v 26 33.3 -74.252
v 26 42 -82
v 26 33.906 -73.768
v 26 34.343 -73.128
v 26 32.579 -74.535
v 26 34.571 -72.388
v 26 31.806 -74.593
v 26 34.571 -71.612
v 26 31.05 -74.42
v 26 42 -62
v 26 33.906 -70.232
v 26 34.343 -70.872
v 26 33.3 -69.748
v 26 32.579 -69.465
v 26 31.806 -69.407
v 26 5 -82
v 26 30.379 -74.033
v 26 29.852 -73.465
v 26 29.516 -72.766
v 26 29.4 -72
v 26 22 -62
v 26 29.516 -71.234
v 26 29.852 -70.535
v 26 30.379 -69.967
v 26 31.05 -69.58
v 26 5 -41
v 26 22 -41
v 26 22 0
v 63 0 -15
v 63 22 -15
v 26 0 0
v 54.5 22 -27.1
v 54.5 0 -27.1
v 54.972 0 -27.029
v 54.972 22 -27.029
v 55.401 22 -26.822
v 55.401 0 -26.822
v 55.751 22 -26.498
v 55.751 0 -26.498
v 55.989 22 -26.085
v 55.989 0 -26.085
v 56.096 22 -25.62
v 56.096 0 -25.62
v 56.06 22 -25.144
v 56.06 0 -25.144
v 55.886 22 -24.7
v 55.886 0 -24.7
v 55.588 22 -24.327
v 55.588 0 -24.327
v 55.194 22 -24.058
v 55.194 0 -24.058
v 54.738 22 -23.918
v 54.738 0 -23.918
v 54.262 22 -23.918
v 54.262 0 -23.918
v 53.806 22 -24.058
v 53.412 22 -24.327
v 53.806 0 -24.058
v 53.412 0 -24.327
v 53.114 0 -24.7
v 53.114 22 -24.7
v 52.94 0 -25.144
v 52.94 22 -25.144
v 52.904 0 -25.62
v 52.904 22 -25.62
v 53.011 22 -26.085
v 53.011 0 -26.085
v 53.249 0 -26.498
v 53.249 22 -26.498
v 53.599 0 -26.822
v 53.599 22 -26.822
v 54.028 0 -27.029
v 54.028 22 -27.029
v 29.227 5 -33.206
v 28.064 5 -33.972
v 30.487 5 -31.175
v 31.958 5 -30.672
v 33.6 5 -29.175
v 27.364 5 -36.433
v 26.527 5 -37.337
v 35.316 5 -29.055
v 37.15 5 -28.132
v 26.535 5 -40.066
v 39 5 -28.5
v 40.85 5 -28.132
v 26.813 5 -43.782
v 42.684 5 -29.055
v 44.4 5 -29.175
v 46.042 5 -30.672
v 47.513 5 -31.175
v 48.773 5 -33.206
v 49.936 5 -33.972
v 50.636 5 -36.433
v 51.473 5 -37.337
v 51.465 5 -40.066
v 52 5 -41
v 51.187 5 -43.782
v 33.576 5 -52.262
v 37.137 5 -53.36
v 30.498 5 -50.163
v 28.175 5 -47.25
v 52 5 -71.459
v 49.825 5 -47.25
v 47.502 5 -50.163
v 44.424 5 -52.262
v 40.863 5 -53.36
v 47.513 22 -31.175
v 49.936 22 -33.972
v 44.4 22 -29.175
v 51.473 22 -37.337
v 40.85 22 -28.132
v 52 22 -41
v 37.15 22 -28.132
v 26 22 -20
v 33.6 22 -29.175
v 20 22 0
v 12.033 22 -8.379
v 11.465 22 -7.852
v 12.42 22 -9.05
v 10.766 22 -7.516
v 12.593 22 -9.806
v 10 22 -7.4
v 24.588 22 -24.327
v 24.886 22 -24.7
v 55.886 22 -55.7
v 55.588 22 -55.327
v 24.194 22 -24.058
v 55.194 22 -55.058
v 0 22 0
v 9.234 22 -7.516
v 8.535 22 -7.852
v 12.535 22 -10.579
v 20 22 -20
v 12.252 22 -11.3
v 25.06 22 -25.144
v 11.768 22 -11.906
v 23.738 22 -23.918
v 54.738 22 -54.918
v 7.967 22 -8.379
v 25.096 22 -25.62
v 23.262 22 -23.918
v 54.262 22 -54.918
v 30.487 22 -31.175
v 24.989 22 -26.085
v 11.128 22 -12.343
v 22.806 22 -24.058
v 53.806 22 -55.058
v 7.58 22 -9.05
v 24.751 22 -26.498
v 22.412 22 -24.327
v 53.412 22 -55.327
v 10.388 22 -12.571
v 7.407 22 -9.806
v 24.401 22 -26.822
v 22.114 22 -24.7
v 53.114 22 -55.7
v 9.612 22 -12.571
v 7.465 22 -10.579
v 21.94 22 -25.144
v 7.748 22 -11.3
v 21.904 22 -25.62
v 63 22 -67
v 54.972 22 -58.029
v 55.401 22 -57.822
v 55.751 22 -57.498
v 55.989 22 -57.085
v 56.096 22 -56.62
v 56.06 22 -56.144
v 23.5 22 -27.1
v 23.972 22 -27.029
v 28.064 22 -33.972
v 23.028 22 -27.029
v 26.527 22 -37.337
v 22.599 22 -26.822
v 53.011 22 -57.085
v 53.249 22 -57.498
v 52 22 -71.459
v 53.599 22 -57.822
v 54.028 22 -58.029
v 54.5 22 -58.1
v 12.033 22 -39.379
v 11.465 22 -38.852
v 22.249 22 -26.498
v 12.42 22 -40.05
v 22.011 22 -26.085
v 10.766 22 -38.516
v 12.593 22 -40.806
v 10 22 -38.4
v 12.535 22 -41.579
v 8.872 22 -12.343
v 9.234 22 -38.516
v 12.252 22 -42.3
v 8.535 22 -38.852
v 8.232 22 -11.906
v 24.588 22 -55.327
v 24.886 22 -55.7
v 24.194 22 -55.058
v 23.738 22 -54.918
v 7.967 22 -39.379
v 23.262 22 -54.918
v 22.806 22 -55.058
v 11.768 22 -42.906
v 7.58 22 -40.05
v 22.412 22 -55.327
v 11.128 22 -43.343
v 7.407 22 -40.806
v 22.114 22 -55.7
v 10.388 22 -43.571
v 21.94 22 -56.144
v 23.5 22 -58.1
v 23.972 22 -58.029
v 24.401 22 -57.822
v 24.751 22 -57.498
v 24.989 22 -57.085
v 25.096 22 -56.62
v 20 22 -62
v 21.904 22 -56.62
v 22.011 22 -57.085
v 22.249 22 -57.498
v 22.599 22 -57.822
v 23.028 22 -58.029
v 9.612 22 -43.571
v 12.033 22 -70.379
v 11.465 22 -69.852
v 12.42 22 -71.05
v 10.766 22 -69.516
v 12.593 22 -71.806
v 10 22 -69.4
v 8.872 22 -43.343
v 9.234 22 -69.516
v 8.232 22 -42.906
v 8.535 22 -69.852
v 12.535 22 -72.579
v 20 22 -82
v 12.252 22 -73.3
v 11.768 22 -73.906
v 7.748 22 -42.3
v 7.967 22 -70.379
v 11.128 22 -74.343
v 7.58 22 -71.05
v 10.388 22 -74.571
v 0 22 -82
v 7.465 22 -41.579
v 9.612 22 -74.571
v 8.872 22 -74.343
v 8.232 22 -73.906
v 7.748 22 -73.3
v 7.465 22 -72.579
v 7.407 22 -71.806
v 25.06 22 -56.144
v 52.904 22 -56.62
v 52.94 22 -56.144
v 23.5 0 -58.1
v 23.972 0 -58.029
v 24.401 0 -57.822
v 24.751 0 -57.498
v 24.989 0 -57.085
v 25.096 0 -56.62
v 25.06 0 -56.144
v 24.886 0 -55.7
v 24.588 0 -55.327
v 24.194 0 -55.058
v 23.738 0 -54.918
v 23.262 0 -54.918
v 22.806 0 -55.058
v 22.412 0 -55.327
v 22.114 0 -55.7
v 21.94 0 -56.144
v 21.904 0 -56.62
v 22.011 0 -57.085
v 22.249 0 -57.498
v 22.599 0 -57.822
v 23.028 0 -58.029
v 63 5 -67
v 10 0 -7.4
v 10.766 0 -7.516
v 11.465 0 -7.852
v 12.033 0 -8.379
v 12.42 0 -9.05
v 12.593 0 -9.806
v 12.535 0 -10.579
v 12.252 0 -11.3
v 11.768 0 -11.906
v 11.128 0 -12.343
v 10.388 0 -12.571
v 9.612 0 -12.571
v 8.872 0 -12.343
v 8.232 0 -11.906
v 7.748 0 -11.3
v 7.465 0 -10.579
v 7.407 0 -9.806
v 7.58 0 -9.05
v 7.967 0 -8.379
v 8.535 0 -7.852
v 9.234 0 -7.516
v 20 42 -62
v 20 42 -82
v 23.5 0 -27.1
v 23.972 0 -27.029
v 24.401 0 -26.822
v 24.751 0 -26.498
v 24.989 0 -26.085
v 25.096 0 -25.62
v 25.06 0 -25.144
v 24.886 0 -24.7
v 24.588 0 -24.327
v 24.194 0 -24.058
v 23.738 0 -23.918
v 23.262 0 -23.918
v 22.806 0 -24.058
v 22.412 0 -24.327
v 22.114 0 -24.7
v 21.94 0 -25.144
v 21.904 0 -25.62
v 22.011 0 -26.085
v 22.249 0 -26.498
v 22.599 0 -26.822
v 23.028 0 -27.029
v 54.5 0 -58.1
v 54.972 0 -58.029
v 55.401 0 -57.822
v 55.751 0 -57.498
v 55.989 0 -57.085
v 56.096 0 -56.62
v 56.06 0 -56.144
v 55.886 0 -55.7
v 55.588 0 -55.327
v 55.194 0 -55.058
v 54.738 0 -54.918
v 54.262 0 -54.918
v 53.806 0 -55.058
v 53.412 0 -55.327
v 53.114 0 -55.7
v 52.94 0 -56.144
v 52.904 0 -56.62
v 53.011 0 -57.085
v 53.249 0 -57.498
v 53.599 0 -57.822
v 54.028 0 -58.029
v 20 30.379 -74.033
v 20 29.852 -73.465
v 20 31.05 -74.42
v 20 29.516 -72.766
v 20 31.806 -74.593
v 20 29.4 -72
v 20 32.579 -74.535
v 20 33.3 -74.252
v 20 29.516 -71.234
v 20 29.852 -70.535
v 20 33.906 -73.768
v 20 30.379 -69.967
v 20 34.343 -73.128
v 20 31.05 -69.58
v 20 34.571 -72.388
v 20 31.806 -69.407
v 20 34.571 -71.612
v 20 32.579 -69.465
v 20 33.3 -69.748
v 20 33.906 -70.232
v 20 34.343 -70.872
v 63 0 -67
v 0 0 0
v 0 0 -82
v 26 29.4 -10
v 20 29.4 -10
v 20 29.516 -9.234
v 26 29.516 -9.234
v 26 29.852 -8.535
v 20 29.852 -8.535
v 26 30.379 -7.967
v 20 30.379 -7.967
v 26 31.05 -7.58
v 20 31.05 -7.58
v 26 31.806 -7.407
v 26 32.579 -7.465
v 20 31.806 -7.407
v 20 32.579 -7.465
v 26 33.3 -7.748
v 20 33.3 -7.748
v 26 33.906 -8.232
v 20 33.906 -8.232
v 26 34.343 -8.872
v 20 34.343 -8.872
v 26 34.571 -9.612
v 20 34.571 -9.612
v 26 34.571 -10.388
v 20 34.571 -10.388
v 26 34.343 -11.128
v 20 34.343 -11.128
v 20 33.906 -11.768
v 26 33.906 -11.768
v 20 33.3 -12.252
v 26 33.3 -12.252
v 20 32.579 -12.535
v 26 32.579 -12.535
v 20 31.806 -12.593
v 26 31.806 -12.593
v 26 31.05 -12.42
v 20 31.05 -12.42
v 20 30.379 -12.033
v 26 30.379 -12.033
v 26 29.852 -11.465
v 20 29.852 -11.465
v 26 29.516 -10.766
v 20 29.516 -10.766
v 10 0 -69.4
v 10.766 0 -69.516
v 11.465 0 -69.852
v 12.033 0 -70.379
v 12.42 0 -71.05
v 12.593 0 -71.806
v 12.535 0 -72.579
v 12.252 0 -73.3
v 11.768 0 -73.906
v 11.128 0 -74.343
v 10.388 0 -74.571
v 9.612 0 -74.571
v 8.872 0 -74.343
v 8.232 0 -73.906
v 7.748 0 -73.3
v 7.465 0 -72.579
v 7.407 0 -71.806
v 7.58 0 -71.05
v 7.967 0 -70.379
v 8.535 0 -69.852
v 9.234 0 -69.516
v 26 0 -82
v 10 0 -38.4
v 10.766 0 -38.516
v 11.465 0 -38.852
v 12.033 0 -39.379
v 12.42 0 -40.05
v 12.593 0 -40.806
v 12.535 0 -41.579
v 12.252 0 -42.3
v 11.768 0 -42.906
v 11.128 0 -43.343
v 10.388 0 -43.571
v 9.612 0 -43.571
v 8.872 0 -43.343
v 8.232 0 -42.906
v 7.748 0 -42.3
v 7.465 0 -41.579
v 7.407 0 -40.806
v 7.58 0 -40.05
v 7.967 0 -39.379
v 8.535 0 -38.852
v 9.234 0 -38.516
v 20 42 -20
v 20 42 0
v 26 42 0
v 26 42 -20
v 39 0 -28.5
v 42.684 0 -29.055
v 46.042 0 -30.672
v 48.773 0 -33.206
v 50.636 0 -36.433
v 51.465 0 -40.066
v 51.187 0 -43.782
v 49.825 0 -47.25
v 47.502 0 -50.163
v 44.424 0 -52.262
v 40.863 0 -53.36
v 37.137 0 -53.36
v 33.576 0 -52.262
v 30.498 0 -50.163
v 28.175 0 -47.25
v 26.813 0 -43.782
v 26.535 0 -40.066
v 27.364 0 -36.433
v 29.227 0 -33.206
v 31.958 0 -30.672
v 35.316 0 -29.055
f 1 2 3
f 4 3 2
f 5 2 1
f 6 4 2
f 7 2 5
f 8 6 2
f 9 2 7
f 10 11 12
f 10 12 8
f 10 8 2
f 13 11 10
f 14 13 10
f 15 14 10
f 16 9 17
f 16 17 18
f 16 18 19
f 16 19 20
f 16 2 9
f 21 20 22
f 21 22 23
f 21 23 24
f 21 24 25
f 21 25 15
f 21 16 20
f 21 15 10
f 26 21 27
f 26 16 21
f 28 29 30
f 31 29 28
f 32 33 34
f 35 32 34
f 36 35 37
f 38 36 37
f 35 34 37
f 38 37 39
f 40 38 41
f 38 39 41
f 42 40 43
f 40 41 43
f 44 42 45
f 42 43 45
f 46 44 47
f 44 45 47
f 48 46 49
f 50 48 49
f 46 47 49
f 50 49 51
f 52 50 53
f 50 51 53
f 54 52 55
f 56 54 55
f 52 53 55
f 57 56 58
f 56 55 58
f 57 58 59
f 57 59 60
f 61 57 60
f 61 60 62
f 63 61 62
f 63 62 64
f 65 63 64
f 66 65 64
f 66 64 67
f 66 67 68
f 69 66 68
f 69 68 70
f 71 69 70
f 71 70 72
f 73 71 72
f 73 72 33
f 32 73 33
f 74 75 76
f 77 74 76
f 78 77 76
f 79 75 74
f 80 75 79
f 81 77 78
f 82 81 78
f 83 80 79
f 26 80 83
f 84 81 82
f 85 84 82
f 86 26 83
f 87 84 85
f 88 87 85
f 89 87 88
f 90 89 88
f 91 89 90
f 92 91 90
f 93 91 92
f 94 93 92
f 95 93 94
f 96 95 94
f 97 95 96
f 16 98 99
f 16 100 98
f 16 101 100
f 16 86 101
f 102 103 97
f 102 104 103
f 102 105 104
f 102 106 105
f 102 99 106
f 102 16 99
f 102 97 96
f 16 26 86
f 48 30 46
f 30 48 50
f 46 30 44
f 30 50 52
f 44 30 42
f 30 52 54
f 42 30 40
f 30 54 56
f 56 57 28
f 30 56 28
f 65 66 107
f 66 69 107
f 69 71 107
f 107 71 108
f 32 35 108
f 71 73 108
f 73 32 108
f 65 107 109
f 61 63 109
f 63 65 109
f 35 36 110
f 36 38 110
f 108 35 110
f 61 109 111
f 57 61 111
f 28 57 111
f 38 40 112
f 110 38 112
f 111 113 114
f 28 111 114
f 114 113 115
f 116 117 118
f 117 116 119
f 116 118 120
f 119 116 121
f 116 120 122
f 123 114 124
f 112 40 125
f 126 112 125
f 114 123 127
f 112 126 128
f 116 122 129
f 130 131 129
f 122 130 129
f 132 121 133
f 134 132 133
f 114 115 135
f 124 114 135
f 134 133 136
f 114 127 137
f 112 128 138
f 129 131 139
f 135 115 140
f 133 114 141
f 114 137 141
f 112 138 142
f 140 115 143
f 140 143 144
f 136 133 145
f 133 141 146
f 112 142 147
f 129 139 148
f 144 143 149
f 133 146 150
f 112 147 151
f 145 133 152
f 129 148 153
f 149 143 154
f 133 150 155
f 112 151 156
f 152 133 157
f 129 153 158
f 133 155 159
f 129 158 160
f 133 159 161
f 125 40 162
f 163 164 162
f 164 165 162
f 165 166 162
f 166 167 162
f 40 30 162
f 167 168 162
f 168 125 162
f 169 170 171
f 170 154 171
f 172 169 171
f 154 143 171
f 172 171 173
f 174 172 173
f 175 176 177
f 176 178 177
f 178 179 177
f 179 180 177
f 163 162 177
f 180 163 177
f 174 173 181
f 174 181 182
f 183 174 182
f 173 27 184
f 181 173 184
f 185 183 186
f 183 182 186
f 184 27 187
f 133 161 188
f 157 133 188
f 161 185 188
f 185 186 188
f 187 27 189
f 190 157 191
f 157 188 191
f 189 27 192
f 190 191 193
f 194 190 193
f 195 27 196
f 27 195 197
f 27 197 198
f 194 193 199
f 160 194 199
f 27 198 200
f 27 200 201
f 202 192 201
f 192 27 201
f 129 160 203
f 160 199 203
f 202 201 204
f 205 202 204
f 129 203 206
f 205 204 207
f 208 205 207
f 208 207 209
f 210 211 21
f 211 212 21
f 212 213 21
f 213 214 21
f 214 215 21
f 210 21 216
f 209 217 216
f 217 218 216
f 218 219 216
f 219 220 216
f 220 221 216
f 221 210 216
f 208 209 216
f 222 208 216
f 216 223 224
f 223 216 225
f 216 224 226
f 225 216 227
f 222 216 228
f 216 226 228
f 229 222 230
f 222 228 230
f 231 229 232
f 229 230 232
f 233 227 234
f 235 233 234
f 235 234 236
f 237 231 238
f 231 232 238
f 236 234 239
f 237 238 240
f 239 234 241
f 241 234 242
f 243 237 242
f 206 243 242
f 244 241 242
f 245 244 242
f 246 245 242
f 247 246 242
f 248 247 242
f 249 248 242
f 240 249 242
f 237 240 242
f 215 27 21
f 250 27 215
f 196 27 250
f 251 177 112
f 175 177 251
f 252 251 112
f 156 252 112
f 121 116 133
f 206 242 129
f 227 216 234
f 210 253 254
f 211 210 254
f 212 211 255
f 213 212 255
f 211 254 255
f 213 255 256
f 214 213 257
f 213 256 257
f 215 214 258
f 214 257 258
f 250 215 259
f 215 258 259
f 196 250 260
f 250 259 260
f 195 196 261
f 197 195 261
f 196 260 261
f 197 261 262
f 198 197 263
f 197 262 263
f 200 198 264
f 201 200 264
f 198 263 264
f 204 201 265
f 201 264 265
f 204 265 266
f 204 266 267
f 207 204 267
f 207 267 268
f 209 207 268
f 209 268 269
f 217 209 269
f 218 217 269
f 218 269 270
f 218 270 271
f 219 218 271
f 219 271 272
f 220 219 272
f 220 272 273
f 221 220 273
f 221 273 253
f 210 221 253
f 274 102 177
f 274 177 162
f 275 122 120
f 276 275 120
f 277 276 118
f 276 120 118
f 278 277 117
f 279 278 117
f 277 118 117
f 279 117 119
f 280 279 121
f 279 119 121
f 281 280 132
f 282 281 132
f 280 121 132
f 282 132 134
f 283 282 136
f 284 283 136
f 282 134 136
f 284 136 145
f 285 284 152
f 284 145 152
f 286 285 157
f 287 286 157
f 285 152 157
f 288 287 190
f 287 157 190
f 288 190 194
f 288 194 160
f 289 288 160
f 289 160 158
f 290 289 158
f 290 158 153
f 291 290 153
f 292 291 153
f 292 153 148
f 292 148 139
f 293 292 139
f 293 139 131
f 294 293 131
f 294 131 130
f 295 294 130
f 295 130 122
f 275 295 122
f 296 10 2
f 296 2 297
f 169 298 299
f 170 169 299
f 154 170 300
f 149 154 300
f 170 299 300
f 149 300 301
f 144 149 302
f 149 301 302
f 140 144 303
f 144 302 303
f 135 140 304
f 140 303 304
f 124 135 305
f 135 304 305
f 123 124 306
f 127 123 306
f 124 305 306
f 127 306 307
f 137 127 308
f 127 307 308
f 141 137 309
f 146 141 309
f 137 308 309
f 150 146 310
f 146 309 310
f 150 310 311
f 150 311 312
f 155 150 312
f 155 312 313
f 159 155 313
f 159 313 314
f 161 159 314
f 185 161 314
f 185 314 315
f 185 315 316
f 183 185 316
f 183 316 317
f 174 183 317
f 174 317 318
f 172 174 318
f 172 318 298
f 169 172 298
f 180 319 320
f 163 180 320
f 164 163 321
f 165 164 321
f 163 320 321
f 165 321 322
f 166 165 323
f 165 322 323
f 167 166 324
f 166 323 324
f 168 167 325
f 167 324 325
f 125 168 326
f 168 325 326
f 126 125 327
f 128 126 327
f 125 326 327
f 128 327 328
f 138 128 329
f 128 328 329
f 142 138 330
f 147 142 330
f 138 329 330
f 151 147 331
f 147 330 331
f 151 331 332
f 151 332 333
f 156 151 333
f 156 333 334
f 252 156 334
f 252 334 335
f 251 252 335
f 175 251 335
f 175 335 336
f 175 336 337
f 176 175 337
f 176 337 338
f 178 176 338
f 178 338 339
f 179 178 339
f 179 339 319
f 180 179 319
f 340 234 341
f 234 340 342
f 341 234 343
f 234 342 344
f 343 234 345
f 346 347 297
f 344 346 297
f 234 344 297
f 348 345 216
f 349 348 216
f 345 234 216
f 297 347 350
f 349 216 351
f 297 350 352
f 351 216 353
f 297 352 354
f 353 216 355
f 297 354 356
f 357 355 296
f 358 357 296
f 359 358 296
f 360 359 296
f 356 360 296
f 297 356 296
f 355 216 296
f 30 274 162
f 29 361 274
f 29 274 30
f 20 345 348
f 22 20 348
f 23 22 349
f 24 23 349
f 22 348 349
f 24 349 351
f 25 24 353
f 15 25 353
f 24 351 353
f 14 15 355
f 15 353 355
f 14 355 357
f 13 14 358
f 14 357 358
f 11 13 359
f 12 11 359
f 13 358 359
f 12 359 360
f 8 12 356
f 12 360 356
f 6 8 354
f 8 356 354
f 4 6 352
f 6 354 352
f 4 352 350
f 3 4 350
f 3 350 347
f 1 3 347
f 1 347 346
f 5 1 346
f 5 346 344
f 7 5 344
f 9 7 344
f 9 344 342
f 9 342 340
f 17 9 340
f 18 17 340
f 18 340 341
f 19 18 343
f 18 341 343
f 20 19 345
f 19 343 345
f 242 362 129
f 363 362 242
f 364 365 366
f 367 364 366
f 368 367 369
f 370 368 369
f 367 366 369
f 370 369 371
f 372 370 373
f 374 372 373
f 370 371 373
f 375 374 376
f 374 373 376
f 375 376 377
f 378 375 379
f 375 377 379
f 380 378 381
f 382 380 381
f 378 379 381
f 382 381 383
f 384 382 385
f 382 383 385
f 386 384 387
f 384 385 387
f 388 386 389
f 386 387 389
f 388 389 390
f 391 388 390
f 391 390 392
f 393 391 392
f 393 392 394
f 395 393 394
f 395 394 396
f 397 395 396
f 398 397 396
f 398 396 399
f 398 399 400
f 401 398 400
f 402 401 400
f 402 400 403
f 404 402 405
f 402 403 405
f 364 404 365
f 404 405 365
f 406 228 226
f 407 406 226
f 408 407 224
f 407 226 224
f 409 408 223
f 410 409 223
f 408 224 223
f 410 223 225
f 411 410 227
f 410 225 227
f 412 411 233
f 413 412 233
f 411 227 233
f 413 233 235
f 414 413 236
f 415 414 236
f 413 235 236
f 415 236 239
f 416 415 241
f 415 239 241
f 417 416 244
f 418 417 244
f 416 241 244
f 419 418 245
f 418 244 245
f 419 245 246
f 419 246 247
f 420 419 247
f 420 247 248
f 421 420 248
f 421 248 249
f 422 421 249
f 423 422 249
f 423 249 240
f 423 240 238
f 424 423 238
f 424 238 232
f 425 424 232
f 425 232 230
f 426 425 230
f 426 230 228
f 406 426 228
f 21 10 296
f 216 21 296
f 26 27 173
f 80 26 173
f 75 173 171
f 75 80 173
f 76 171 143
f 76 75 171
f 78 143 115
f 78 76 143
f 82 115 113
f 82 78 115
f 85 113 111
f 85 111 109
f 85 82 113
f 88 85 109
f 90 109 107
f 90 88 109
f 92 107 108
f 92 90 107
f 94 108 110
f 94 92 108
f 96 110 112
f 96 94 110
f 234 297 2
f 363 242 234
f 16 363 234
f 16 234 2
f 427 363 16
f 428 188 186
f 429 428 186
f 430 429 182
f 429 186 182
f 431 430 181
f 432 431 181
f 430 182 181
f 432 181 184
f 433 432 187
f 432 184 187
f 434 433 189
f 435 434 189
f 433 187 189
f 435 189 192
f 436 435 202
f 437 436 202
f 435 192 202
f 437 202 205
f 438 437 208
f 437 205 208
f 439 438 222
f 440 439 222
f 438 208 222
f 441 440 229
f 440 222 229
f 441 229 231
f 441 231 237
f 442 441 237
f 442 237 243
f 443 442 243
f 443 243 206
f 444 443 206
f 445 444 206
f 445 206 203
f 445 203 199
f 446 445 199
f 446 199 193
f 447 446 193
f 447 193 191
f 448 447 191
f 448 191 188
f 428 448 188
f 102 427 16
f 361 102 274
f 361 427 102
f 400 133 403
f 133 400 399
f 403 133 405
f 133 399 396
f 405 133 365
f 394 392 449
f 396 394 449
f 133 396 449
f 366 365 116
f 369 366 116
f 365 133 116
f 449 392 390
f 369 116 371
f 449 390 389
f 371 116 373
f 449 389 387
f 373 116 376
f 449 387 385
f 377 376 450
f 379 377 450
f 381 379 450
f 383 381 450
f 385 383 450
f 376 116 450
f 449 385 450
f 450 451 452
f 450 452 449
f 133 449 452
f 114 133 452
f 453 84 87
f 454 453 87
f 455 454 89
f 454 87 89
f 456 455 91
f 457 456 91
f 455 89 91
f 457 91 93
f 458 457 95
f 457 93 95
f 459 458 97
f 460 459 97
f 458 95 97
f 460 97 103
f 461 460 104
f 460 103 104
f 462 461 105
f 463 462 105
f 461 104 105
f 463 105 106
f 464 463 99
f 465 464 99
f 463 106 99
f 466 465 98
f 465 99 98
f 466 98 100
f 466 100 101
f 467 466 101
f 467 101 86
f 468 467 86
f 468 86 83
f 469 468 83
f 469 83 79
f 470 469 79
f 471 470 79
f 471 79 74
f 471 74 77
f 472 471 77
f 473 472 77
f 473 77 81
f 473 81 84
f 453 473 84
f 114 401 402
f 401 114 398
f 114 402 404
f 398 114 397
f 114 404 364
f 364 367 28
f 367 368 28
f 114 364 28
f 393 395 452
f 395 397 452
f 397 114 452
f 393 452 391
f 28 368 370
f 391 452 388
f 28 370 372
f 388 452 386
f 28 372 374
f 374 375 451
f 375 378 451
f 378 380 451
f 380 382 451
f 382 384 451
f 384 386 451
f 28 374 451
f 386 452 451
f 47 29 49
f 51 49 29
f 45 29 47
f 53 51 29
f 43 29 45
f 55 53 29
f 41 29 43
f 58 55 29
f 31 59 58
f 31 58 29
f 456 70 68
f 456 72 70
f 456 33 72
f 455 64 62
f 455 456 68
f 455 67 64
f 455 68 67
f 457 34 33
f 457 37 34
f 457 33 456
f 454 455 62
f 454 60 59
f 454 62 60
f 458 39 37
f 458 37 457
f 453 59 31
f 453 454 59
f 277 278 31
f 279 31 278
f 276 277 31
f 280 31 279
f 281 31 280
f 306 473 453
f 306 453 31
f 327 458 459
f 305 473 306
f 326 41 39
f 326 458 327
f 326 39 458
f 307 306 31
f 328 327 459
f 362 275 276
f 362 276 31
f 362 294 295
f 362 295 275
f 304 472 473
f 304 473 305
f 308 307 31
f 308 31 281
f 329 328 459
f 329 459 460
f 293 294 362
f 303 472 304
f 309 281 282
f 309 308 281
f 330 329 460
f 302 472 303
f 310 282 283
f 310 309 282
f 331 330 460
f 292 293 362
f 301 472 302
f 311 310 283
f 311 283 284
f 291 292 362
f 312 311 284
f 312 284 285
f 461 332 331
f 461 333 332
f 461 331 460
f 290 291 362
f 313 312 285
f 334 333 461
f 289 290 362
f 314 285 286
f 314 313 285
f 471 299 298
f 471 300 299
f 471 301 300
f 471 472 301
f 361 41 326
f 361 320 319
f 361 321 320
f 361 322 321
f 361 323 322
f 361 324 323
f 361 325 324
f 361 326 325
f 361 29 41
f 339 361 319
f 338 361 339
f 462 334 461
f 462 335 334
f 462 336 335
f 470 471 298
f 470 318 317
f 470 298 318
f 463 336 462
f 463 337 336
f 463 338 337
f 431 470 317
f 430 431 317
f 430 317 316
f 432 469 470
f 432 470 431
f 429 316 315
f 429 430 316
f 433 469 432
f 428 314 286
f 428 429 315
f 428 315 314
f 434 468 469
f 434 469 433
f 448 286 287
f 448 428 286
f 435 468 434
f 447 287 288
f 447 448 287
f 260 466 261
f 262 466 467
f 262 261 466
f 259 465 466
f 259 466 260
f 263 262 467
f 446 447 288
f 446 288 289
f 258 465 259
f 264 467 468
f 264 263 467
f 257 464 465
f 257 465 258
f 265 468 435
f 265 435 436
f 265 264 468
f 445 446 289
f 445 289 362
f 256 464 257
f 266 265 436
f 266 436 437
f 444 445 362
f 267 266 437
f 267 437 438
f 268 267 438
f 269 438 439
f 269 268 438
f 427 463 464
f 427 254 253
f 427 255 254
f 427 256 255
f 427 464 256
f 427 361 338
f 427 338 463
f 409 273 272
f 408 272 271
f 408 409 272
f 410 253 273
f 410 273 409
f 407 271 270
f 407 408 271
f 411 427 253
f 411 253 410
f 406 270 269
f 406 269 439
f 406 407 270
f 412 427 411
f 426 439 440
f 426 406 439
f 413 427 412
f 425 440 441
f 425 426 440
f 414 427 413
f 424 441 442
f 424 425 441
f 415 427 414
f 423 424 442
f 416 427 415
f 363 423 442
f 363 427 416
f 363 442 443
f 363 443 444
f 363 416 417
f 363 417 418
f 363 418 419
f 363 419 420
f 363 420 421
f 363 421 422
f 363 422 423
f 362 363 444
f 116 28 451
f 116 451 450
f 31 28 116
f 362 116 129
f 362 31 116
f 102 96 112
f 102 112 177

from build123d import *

# Parameters (mm, degrees)
BOSS_EXTRUDE1_DEPTH = 42
SKETCH2_W           = 20
SKETCH2_H           = 20
CUT_EXTRUDE1_DEPTH  = 112.610931364
CUT_EXTRUDE2_DEPTH  = 37
SKETCH6_R           = 2.6
CUT_EXTRUDE4_DEPTH  = 106.721331812
SKETCH5_R           = 2.6
CUT_EXTRUDE3_DEPTH  = 6
BOSS_EXTRUDE2_DEPTH = 17
SKETCH7_R           = 12.5
CUT_EXTRUDE5_DEPTH  = 110.827136902
BOSS_EXTRUDE4_DEPTH = 17
SKETCH12_R          = 1.6
CUT_EXTRUDE6_DEPTH  = 112.610931364


with BuildPart() as part:
    # Sketch1 → Boss-Extrude1 (new body)
    with BuildSketch(Plane(origin=(0, 0, 0), x_dir=(1, 0, 0), z_dir=(0, 1, 0))):
        Polygon((0, 0), (0, 82), (26, 82), (63, 67), (63, 15), (26, 0), align=None)
    extrude(amount=BOSS_EXTRUDE1_DEPTH)

    # Sketch2 → Cut-Extrude1 (cut, through all)
    with BuildSketch(Plane.XY):
        with Locations((10, 32)):
            Rectangle(SKETCH2_W, SKETCH2_H)
    extrude(amount=-CUT_EXTRUDE1_DEPTH, mode=Mode.SUBTRACT)

    # Sketch3 → Cut-Extrude2 (cut)
    with BuildSketch(Plane(origin=(0, 42, 0), x_dir=(1, 0, 0), z_dir=(0, 1, 0))):
        Polygon((26, 82), (26, 62), (20, 62), (20, 20), (26, 20), (26, 0), (63, 15), (63, 67), align=None)
    extrude(amount=-CUT_EXTRUDE2_DEPTH, mode=Mode.SUBTRACT)

    # Sketch6 → Cut-Extrude4 (cut, through all)
    with BuildSketch(Plane(origin=(0, 22, 0), x_dir=(1, 0, 0), z_dir=(0, 1, 0))):
        with Locations(Location((10, 72, 0), (0, 0, 270))):
            Circle(SKETCH6_R)
        with Locations(Location((10, 41, 0), (0, 0, 270))):
            Circle(SKETCH6_R)
        with Locations(Location((10, 10, 0), (0, 0, 270))):
            Circle(SKETCH6_R)
    extrude(amount=-CUT_EXTRUDE4_DEPTH, mode=Mode.SUBTRACT)

    # Sketch5 → Cut-Extrude3 (cut)
    with BuildSketch(Plane.ZY.offset(-20)):
        with Locations(Location((-72, 32, 0), (0, 0, 270))):
            Circle(SKETCH5_R)
        with Locations(Location((-10, 32, 0), (0, 0, 270))):
            Circle(SKETCH5_R)
    extrude(amount=-CUT_EXTRUDE3_DEPTH, mode=Mode.SUBTRACT)

    # Sketch4 → Boss-Extrude2 (add)
    with BuildSketch(Plane(origin=(0, 5, 0), x_dir=(1, 0, 0), z_dir=(0, 1, 0))):
        Polygon((26, 20), (63, 20), (63, 15), (26, 0), align=None)
    extrude(amount=BOSS_EXTRUDE2_DEPTH)

    # Sketch7 → Cut-Extrude5 (cut, through all)
    with BuildSketch(Plane(origin=(0, 5, 0), x_dir=(1, 0, 0), z_dir=(0, 1, 0))):
        with Locations(Location((39, 41, 0), (0, 0, 270))):
            Circle(SKETCH7_R)
    extrude(amount=-CUT_EXTRUDE5_DEPTH, mode=Mode.SUBTRACT)

    # Sketch10 → Boss-Extrude4 (add)
    with BuildSketch(Plane(origin=(0, 5, 0), x_dir=(1, 0, 0), z_dir=(0, 1, 0))):
        with BuildLine():
            Line((26, 62), (26, 41))
            ThreePointArc((26, 41), (39, 28), (52, 41))
            Line((52, 41), (52, 71.459459459))
            Line((52, 71.459459459), (63, 67))
            Line((63, 67), (63, 20))
            Line((63, 20), (20, 20))
            Line((20, 20), (20, 62))
            Line((20, 62), (26, 62))
        make_face()
    extrude(amount=BOSS_EXTRUDE4_DEPTH)

    # Sketch12 → Cut-Extrude6 (cut, through all)
    with BuildSketch(Plane.XZ):
        with Locations(Location((23.5, -25.5, 0), (0, 0, 270))):
            Circle(SKETCH12_R)
        with Locations(Location((54.5, -25.5, 0), (0, 0, 270))):
            Circle(SKETCH12_R)
        with Locations(Location((54.5, -56.5, 0), (0, 0, 270))):
            Circle(SKETCH12_R)
        with Locations(Location((23.5, -56.5, 0), (0, 0, 270))):
            Circle(SKETCH12_R)
    extrude(amount=-CUT_EXTRUDE6_DEPTH, mode=Mode.SUBTRACT)


solid = part.part
